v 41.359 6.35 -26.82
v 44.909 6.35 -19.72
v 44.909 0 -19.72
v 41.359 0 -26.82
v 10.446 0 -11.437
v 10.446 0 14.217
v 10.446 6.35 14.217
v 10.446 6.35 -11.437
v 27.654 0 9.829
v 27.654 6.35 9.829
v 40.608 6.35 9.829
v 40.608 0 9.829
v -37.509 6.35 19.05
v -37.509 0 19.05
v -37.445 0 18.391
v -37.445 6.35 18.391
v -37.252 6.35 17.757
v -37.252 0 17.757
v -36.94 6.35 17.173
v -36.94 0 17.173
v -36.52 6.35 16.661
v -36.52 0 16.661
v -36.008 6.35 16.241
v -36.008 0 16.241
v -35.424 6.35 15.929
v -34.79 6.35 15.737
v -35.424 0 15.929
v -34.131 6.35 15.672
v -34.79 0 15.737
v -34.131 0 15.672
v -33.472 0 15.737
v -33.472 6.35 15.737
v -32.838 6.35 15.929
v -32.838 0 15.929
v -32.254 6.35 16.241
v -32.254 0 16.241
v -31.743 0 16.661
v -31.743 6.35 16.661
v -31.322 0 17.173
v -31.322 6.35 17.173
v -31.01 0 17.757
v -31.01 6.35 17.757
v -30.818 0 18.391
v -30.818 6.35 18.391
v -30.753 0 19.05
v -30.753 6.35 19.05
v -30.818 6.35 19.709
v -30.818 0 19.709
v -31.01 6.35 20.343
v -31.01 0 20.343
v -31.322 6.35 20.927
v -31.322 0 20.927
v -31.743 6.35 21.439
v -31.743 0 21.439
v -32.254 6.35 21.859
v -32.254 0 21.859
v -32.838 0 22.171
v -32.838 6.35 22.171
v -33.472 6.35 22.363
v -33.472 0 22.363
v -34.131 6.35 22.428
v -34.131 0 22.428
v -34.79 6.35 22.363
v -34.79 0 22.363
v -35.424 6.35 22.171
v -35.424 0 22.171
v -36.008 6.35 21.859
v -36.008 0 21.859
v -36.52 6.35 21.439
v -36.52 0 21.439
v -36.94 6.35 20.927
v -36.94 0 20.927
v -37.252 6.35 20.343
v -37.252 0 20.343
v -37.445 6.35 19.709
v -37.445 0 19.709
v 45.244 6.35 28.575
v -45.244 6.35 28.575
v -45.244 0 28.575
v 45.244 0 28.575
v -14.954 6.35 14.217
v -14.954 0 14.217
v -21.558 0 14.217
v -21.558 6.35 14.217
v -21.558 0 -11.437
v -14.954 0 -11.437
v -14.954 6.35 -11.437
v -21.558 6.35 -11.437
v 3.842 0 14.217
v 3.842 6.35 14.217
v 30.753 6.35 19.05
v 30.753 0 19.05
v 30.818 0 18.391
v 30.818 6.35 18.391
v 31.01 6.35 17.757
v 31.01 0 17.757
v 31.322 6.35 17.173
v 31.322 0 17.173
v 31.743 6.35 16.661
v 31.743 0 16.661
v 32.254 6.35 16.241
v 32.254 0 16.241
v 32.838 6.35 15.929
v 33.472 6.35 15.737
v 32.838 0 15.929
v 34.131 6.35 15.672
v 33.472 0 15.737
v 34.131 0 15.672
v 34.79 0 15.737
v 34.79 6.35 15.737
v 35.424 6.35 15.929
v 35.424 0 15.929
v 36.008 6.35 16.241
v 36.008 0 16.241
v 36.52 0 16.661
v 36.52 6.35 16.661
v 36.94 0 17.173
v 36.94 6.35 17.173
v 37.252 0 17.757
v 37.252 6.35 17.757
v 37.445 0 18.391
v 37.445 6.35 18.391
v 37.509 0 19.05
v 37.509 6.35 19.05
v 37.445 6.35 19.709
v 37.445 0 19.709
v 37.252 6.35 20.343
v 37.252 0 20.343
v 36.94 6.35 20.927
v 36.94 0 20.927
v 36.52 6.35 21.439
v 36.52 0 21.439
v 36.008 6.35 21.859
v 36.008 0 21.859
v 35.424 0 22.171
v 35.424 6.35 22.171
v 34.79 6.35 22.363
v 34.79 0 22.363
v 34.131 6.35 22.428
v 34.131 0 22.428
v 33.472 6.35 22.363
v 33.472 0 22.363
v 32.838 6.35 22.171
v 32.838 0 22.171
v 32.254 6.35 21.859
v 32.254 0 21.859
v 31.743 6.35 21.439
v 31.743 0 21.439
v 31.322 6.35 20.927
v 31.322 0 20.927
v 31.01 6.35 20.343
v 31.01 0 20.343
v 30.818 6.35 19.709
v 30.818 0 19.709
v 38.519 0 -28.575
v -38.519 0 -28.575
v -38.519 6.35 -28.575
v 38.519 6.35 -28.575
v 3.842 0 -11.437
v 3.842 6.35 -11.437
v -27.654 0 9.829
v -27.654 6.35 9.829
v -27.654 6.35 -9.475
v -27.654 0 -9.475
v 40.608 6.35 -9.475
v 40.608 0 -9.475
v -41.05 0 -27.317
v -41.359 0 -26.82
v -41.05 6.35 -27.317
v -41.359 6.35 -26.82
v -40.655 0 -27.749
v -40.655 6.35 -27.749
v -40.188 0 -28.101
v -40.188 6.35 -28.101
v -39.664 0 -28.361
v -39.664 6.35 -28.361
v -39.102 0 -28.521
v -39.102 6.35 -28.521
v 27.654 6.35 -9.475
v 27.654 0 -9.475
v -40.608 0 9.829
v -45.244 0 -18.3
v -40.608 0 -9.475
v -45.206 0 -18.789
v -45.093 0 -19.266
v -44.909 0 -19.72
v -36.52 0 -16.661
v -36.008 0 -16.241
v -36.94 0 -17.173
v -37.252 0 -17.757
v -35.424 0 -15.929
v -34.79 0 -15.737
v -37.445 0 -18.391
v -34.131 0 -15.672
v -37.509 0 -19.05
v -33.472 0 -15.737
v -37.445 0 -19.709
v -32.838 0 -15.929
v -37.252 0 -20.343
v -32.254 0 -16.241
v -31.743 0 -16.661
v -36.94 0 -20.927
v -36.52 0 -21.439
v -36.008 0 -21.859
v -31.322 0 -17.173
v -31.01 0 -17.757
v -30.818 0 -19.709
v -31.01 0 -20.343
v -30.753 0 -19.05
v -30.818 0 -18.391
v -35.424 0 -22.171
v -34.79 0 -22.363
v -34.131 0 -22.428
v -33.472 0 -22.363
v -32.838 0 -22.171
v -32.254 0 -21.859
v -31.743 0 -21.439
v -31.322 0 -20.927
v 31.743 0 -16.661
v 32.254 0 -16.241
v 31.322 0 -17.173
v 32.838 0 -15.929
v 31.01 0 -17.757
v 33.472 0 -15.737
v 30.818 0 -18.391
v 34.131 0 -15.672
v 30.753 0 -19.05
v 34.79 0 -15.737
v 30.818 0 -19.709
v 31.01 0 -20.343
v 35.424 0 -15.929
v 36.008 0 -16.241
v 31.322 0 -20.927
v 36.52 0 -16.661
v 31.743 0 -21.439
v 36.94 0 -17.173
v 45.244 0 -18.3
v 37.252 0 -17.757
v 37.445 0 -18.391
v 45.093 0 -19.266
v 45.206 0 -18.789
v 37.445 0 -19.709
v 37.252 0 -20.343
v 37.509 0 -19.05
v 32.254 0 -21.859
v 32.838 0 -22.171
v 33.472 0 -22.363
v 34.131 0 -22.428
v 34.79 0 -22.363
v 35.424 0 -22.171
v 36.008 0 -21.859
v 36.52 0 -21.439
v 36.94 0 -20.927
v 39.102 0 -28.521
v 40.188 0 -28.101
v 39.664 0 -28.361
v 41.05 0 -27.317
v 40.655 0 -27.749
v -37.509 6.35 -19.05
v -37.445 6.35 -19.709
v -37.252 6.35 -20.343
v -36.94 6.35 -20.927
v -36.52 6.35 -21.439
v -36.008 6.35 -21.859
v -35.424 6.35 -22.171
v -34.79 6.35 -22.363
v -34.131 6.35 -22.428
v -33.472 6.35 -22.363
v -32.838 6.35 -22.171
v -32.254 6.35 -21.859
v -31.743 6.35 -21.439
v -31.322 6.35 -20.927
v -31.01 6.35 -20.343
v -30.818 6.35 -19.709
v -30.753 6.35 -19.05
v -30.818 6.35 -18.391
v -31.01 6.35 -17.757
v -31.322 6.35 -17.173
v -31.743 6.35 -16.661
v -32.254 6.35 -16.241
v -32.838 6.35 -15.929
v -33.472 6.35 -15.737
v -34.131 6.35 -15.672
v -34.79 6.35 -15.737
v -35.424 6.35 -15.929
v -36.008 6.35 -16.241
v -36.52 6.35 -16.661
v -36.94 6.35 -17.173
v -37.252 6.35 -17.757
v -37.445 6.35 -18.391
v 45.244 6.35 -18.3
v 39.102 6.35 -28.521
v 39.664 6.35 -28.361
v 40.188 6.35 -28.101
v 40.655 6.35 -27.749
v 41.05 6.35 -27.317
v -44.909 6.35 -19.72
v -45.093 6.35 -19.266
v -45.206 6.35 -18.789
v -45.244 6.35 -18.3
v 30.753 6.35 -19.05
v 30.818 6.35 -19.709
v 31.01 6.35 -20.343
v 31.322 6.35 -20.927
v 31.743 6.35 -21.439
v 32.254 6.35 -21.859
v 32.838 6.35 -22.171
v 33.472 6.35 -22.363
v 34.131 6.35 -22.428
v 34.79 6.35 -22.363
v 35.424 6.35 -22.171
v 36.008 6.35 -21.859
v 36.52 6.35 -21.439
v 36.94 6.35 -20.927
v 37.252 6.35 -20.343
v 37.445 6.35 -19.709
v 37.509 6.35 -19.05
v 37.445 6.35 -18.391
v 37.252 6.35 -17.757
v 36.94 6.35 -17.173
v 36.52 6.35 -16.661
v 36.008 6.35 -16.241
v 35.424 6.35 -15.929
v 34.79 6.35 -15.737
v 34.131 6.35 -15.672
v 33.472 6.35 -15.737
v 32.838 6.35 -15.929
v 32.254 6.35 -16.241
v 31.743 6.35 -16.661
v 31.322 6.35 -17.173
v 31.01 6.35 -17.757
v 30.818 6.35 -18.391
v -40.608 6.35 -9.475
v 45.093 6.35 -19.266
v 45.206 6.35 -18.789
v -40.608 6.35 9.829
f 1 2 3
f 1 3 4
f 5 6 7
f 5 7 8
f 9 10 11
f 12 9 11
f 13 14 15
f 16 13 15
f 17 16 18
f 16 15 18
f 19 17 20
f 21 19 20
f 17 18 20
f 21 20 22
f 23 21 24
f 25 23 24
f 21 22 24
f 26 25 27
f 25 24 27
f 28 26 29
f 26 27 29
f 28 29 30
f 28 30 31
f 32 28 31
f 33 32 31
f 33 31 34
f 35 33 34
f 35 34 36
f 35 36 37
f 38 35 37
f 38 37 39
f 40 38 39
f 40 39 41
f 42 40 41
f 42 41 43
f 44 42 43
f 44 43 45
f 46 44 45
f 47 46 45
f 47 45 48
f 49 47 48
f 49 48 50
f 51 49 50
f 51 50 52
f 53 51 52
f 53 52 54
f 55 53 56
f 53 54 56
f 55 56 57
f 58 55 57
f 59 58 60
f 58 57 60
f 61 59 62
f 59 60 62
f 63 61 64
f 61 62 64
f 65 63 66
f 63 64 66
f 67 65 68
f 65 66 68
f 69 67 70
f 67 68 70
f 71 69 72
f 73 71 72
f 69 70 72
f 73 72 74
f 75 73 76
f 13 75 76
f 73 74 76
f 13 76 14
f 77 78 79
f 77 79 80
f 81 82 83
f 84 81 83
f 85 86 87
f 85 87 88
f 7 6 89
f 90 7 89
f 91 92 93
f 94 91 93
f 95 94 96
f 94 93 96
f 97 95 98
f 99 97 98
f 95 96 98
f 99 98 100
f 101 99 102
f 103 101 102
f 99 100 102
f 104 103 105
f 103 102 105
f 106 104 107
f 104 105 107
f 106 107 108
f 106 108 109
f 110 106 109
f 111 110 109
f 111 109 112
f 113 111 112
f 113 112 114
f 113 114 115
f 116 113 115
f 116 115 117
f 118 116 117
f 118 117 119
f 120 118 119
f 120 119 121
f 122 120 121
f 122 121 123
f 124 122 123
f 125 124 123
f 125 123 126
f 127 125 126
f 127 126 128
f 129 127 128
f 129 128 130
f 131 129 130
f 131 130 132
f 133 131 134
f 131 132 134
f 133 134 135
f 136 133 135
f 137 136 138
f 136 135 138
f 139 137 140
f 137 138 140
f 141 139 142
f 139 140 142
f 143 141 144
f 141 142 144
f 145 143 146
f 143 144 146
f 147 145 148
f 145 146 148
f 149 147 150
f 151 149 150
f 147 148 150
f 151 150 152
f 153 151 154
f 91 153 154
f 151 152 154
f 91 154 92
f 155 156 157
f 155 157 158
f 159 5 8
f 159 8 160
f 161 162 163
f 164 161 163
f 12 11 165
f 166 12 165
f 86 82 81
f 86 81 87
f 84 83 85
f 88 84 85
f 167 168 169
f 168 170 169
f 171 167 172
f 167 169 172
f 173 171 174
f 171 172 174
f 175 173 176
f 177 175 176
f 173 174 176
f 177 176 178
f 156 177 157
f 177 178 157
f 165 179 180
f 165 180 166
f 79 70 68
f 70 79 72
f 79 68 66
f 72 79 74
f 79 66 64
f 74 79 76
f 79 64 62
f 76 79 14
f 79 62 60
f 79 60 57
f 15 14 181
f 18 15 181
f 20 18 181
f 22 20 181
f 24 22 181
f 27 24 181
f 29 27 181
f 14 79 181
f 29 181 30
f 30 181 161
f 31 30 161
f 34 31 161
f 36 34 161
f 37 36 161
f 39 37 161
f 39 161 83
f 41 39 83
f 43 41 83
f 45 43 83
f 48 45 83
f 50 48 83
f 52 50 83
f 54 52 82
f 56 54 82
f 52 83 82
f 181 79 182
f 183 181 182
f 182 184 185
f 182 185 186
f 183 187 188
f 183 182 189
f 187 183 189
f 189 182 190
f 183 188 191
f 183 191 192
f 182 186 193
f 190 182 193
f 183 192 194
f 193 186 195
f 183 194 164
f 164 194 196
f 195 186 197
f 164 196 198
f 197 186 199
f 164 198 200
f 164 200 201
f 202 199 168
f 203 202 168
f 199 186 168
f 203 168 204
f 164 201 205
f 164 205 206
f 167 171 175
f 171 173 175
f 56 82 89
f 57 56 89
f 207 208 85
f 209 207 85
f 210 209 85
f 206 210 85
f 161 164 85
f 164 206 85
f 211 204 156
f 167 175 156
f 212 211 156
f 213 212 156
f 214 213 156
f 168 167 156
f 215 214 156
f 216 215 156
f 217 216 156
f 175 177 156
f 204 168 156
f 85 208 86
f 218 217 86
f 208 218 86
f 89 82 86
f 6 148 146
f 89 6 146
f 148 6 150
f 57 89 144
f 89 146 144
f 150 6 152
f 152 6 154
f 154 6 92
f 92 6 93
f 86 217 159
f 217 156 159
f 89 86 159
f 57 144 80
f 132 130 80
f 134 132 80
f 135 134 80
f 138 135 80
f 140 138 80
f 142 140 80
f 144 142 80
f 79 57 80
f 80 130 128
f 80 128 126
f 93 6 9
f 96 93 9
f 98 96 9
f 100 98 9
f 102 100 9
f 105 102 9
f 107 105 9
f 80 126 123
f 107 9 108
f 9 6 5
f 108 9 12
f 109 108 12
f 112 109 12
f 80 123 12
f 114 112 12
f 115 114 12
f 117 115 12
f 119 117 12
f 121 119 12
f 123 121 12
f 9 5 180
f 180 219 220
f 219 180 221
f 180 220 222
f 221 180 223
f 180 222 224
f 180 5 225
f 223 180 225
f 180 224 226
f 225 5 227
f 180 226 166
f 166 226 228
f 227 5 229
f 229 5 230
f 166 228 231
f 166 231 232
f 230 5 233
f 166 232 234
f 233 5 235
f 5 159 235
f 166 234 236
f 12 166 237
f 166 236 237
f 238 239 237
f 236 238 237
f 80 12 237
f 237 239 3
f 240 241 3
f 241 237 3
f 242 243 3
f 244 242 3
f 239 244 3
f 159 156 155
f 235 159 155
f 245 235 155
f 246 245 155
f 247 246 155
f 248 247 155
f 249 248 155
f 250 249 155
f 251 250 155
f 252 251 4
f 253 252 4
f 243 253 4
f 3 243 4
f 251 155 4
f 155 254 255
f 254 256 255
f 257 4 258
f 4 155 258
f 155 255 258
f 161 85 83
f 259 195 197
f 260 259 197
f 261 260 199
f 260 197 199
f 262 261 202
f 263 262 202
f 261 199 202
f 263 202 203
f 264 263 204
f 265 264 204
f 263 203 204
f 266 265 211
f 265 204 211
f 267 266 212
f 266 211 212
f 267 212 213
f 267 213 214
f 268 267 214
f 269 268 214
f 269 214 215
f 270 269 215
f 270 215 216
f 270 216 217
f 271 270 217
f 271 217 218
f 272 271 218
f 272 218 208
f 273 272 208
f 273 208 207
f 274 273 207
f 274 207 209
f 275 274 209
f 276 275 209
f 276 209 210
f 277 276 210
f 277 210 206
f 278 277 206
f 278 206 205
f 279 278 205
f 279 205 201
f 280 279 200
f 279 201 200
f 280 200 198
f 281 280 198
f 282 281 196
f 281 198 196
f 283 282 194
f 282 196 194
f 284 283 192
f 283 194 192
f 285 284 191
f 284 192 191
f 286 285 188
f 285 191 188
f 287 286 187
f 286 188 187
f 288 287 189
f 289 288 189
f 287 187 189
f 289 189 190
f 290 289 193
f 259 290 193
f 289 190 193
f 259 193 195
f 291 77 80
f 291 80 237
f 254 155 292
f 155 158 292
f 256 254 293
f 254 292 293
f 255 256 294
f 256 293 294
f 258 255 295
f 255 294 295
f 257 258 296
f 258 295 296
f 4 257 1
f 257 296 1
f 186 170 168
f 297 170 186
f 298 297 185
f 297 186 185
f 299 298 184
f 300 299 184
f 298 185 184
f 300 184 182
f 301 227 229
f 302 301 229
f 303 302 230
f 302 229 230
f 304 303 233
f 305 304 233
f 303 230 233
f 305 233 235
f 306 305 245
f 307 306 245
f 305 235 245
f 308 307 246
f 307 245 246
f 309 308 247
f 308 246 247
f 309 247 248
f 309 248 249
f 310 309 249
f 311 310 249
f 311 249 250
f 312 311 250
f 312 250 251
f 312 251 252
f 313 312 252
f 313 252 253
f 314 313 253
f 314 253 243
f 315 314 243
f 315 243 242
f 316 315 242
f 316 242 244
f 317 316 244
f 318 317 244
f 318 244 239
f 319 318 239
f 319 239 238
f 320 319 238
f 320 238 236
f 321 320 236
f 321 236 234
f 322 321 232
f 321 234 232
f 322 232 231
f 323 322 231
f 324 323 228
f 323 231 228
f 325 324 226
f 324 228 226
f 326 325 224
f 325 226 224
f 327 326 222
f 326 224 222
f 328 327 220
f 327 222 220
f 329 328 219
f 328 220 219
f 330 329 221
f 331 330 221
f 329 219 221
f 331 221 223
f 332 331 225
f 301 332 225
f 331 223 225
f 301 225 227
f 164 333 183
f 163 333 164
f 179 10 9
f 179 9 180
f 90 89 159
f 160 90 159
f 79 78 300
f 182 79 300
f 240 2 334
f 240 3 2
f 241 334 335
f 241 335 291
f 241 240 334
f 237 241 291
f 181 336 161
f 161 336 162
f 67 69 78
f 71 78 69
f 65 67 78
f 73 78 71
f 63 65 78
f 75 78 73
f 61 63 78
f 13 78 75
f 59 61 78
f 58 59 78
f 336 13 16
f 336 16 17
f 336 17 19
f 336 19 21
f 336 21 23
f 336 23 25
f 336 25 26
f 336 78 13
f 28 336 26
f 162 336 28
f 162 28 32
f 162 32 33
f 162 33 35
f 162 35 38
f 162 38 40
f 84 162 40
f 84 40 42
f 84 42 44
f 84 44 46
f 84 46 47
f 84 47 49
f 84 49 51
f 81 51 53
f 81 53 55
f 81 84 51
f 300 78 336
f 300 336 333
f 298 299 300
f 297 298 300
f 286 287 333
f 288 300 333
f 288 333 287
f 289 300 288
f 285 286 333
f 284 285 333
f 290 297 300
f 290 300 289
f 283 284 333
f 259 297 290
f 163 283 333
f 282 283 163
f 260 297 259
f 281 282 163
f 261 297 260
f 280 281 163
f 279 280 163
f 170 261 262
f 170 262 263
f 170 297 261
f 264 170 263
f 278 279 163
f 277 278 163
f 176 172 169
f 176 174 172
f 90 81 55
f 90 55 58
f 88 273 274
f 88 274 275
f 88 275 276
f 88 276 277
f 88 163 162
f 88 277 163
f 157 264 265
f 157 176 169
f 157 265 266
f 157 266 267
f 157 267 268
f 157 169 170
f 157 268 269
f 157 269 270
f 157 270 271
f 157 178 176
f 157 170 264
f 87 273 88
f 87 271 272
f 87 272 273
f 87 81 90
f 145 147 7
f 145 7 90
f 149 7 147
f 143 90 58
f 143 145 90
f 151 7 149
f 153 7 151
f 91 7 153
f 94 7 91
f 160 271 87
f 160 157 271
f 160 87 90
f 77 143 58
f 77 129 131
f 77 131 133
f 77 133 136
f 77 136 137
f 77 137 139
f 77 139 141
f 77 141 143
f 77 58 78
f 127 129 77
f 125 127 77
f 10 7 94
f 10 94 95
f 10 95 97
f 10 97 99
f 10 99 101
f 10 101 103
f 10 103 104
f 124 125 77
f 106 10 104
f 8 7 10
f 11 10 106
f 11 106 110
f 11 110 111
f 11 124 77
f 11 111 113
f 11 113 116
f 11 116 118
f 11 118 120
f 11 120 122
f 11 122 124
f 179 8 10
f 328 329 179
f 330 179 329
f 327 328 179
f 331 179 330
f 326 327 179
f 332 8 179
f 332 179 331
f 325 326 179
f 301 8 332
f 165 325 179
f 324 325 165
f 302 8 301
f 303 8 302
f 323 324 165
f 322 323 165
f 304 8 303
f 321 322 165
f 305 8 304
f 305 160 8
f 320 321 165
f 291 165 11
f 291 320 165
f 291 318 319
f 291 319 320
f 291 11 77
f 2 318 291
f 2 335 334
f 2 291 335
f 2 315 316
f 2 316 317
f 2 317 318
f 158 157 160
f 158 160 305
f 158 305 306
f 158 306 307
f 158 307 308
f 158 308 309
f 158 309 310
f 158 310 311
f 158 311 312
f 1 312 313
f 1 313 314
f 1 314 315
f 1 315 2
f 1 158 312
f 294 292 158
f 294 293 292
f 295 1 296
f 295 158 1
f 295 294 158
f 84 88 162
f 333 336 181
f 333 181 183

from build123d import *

# Parameters (mm, degrees)
SKETCH1_W               = 80.9625
SKETCH1_H               = 57.15
BOSS_EXTRUDE1_DEPTH     = 6.35
SKETCH2_W               = 6.604
SKETCH2_H               = 25.654
CUT_EXTRUDE1_DEPTH      = 7.35
F_1_4_CLEARANCE_HOLE1_D = 6.7564
SKETCH5_W               = 4.7625
SKETCH5_H               = 47.625
BOSS_EXTRUDE3_DEPTH     = 6.35
FILLET1_R               = 3.175
SKETCH6_W               = 12.954
SKETCH6_H               = 19.304
CUT_EXTRUDE2_DEPTH      = 7.35


with BuildPart() as part:
    # Sketch1 → Boss-Extrude1 (new body)
    with BuildSketch(Plane(origin=(0, 0, 0), x_dir=(1, 0, 0), z_dir=(0, 1, 0))):
        Rectangle(SKETCH1_W, SKETCH1_H)
    extrude(amount=BOSS_EXTRUDE1_DEPTH)

    # Sketch2 → Cut-Extrude1 (cut, through all)
    with BuildSketch(Plane(origin=(0, 0, 0), x_dir=(-1, 0, 0), z_dir=(0, -1, 0))):
        with Locations((-7.14375, -1.389678771)):
            Rectangle(SKETCH2_W, SKETCH2_H)
        with Locations((18.25625, -1.389678771)):
            Rectangle(SKETCH2_W, SKETCH2_H)
    extrude(amount=-CUT_EXTRUDE1_DEPTH, mode=Mode.SUBTRACT)

    # 1/4 Clearance Hole1 (through all)
    with Locations(Plane(origin=(0, 6.35, 0), x_dir=(1, 0, 0), z_dir=(0, 1, 0))):
        with Locations((-34.13125, 19.05), (-34.13125, -19.05), (34.13125, -19.05), (34.13125, 19.05)):
            Hole(F_1_4_CLEARANCE_HOLE1_D / 2)

    # Sketch5 → Boss-Extrude3 (add)
    with BuildSketch(Plane(origin=(0, 6.35, 0), x_dir=(1, 0, 0), z_dir=(0, 1, 0))):
        with Locations((42.8625, -4.7625)):
            Rectangle(SKETCH5_W, SKETCH5_H)
        Polygon((40.48125, 28.575), (40.48125, 19.05), (45.24375, 19.05), align=None)
        with Locations((-42.8625, -4.7625)):
            Rectangle(SKETCH5_W, SKETCH5_H)
        Polygon((-40.48125, 28.575), (-45.24375, 19.05), (-40.48125, 19.05), align=None)
    extrude(amount=-BOSS_EXTRUDE3_DEPTH)

    # Fillet1
    fillet1_edges = [part.edges().sort_by_distance(p)[0] for p in [
        (-40.48125, 3.175, -28.575),
        (40.48125, 3.175, -28.575),
        (45.24375, 3.175, -19.05),
        (-45.24375, 3.175, -19.05),
    ]]
    fillet(fillet1_edges, radius=FILLET1_R)

    # Sketch6 → Cut-Extrude2 (cut, through all)
    with BuildSketch(Plane(origin=(0, 6.35, 0), x_dir=(1, 0, 0), z_dir=(0, 1, 0))):
        with Locations((-34.13125, -0.176936686)):
            Rectangle(SKETCH6_W, SKETCH6_H)
        with Locations((34.13125, -0.176936686)):
            Rectangle(SKETCH6_W, SKETCH6_H)
    extrude(amount=-CUT_EXTRUDE2_DEPTH, mode=Mode.SUBTRACT)


solid = part.part
